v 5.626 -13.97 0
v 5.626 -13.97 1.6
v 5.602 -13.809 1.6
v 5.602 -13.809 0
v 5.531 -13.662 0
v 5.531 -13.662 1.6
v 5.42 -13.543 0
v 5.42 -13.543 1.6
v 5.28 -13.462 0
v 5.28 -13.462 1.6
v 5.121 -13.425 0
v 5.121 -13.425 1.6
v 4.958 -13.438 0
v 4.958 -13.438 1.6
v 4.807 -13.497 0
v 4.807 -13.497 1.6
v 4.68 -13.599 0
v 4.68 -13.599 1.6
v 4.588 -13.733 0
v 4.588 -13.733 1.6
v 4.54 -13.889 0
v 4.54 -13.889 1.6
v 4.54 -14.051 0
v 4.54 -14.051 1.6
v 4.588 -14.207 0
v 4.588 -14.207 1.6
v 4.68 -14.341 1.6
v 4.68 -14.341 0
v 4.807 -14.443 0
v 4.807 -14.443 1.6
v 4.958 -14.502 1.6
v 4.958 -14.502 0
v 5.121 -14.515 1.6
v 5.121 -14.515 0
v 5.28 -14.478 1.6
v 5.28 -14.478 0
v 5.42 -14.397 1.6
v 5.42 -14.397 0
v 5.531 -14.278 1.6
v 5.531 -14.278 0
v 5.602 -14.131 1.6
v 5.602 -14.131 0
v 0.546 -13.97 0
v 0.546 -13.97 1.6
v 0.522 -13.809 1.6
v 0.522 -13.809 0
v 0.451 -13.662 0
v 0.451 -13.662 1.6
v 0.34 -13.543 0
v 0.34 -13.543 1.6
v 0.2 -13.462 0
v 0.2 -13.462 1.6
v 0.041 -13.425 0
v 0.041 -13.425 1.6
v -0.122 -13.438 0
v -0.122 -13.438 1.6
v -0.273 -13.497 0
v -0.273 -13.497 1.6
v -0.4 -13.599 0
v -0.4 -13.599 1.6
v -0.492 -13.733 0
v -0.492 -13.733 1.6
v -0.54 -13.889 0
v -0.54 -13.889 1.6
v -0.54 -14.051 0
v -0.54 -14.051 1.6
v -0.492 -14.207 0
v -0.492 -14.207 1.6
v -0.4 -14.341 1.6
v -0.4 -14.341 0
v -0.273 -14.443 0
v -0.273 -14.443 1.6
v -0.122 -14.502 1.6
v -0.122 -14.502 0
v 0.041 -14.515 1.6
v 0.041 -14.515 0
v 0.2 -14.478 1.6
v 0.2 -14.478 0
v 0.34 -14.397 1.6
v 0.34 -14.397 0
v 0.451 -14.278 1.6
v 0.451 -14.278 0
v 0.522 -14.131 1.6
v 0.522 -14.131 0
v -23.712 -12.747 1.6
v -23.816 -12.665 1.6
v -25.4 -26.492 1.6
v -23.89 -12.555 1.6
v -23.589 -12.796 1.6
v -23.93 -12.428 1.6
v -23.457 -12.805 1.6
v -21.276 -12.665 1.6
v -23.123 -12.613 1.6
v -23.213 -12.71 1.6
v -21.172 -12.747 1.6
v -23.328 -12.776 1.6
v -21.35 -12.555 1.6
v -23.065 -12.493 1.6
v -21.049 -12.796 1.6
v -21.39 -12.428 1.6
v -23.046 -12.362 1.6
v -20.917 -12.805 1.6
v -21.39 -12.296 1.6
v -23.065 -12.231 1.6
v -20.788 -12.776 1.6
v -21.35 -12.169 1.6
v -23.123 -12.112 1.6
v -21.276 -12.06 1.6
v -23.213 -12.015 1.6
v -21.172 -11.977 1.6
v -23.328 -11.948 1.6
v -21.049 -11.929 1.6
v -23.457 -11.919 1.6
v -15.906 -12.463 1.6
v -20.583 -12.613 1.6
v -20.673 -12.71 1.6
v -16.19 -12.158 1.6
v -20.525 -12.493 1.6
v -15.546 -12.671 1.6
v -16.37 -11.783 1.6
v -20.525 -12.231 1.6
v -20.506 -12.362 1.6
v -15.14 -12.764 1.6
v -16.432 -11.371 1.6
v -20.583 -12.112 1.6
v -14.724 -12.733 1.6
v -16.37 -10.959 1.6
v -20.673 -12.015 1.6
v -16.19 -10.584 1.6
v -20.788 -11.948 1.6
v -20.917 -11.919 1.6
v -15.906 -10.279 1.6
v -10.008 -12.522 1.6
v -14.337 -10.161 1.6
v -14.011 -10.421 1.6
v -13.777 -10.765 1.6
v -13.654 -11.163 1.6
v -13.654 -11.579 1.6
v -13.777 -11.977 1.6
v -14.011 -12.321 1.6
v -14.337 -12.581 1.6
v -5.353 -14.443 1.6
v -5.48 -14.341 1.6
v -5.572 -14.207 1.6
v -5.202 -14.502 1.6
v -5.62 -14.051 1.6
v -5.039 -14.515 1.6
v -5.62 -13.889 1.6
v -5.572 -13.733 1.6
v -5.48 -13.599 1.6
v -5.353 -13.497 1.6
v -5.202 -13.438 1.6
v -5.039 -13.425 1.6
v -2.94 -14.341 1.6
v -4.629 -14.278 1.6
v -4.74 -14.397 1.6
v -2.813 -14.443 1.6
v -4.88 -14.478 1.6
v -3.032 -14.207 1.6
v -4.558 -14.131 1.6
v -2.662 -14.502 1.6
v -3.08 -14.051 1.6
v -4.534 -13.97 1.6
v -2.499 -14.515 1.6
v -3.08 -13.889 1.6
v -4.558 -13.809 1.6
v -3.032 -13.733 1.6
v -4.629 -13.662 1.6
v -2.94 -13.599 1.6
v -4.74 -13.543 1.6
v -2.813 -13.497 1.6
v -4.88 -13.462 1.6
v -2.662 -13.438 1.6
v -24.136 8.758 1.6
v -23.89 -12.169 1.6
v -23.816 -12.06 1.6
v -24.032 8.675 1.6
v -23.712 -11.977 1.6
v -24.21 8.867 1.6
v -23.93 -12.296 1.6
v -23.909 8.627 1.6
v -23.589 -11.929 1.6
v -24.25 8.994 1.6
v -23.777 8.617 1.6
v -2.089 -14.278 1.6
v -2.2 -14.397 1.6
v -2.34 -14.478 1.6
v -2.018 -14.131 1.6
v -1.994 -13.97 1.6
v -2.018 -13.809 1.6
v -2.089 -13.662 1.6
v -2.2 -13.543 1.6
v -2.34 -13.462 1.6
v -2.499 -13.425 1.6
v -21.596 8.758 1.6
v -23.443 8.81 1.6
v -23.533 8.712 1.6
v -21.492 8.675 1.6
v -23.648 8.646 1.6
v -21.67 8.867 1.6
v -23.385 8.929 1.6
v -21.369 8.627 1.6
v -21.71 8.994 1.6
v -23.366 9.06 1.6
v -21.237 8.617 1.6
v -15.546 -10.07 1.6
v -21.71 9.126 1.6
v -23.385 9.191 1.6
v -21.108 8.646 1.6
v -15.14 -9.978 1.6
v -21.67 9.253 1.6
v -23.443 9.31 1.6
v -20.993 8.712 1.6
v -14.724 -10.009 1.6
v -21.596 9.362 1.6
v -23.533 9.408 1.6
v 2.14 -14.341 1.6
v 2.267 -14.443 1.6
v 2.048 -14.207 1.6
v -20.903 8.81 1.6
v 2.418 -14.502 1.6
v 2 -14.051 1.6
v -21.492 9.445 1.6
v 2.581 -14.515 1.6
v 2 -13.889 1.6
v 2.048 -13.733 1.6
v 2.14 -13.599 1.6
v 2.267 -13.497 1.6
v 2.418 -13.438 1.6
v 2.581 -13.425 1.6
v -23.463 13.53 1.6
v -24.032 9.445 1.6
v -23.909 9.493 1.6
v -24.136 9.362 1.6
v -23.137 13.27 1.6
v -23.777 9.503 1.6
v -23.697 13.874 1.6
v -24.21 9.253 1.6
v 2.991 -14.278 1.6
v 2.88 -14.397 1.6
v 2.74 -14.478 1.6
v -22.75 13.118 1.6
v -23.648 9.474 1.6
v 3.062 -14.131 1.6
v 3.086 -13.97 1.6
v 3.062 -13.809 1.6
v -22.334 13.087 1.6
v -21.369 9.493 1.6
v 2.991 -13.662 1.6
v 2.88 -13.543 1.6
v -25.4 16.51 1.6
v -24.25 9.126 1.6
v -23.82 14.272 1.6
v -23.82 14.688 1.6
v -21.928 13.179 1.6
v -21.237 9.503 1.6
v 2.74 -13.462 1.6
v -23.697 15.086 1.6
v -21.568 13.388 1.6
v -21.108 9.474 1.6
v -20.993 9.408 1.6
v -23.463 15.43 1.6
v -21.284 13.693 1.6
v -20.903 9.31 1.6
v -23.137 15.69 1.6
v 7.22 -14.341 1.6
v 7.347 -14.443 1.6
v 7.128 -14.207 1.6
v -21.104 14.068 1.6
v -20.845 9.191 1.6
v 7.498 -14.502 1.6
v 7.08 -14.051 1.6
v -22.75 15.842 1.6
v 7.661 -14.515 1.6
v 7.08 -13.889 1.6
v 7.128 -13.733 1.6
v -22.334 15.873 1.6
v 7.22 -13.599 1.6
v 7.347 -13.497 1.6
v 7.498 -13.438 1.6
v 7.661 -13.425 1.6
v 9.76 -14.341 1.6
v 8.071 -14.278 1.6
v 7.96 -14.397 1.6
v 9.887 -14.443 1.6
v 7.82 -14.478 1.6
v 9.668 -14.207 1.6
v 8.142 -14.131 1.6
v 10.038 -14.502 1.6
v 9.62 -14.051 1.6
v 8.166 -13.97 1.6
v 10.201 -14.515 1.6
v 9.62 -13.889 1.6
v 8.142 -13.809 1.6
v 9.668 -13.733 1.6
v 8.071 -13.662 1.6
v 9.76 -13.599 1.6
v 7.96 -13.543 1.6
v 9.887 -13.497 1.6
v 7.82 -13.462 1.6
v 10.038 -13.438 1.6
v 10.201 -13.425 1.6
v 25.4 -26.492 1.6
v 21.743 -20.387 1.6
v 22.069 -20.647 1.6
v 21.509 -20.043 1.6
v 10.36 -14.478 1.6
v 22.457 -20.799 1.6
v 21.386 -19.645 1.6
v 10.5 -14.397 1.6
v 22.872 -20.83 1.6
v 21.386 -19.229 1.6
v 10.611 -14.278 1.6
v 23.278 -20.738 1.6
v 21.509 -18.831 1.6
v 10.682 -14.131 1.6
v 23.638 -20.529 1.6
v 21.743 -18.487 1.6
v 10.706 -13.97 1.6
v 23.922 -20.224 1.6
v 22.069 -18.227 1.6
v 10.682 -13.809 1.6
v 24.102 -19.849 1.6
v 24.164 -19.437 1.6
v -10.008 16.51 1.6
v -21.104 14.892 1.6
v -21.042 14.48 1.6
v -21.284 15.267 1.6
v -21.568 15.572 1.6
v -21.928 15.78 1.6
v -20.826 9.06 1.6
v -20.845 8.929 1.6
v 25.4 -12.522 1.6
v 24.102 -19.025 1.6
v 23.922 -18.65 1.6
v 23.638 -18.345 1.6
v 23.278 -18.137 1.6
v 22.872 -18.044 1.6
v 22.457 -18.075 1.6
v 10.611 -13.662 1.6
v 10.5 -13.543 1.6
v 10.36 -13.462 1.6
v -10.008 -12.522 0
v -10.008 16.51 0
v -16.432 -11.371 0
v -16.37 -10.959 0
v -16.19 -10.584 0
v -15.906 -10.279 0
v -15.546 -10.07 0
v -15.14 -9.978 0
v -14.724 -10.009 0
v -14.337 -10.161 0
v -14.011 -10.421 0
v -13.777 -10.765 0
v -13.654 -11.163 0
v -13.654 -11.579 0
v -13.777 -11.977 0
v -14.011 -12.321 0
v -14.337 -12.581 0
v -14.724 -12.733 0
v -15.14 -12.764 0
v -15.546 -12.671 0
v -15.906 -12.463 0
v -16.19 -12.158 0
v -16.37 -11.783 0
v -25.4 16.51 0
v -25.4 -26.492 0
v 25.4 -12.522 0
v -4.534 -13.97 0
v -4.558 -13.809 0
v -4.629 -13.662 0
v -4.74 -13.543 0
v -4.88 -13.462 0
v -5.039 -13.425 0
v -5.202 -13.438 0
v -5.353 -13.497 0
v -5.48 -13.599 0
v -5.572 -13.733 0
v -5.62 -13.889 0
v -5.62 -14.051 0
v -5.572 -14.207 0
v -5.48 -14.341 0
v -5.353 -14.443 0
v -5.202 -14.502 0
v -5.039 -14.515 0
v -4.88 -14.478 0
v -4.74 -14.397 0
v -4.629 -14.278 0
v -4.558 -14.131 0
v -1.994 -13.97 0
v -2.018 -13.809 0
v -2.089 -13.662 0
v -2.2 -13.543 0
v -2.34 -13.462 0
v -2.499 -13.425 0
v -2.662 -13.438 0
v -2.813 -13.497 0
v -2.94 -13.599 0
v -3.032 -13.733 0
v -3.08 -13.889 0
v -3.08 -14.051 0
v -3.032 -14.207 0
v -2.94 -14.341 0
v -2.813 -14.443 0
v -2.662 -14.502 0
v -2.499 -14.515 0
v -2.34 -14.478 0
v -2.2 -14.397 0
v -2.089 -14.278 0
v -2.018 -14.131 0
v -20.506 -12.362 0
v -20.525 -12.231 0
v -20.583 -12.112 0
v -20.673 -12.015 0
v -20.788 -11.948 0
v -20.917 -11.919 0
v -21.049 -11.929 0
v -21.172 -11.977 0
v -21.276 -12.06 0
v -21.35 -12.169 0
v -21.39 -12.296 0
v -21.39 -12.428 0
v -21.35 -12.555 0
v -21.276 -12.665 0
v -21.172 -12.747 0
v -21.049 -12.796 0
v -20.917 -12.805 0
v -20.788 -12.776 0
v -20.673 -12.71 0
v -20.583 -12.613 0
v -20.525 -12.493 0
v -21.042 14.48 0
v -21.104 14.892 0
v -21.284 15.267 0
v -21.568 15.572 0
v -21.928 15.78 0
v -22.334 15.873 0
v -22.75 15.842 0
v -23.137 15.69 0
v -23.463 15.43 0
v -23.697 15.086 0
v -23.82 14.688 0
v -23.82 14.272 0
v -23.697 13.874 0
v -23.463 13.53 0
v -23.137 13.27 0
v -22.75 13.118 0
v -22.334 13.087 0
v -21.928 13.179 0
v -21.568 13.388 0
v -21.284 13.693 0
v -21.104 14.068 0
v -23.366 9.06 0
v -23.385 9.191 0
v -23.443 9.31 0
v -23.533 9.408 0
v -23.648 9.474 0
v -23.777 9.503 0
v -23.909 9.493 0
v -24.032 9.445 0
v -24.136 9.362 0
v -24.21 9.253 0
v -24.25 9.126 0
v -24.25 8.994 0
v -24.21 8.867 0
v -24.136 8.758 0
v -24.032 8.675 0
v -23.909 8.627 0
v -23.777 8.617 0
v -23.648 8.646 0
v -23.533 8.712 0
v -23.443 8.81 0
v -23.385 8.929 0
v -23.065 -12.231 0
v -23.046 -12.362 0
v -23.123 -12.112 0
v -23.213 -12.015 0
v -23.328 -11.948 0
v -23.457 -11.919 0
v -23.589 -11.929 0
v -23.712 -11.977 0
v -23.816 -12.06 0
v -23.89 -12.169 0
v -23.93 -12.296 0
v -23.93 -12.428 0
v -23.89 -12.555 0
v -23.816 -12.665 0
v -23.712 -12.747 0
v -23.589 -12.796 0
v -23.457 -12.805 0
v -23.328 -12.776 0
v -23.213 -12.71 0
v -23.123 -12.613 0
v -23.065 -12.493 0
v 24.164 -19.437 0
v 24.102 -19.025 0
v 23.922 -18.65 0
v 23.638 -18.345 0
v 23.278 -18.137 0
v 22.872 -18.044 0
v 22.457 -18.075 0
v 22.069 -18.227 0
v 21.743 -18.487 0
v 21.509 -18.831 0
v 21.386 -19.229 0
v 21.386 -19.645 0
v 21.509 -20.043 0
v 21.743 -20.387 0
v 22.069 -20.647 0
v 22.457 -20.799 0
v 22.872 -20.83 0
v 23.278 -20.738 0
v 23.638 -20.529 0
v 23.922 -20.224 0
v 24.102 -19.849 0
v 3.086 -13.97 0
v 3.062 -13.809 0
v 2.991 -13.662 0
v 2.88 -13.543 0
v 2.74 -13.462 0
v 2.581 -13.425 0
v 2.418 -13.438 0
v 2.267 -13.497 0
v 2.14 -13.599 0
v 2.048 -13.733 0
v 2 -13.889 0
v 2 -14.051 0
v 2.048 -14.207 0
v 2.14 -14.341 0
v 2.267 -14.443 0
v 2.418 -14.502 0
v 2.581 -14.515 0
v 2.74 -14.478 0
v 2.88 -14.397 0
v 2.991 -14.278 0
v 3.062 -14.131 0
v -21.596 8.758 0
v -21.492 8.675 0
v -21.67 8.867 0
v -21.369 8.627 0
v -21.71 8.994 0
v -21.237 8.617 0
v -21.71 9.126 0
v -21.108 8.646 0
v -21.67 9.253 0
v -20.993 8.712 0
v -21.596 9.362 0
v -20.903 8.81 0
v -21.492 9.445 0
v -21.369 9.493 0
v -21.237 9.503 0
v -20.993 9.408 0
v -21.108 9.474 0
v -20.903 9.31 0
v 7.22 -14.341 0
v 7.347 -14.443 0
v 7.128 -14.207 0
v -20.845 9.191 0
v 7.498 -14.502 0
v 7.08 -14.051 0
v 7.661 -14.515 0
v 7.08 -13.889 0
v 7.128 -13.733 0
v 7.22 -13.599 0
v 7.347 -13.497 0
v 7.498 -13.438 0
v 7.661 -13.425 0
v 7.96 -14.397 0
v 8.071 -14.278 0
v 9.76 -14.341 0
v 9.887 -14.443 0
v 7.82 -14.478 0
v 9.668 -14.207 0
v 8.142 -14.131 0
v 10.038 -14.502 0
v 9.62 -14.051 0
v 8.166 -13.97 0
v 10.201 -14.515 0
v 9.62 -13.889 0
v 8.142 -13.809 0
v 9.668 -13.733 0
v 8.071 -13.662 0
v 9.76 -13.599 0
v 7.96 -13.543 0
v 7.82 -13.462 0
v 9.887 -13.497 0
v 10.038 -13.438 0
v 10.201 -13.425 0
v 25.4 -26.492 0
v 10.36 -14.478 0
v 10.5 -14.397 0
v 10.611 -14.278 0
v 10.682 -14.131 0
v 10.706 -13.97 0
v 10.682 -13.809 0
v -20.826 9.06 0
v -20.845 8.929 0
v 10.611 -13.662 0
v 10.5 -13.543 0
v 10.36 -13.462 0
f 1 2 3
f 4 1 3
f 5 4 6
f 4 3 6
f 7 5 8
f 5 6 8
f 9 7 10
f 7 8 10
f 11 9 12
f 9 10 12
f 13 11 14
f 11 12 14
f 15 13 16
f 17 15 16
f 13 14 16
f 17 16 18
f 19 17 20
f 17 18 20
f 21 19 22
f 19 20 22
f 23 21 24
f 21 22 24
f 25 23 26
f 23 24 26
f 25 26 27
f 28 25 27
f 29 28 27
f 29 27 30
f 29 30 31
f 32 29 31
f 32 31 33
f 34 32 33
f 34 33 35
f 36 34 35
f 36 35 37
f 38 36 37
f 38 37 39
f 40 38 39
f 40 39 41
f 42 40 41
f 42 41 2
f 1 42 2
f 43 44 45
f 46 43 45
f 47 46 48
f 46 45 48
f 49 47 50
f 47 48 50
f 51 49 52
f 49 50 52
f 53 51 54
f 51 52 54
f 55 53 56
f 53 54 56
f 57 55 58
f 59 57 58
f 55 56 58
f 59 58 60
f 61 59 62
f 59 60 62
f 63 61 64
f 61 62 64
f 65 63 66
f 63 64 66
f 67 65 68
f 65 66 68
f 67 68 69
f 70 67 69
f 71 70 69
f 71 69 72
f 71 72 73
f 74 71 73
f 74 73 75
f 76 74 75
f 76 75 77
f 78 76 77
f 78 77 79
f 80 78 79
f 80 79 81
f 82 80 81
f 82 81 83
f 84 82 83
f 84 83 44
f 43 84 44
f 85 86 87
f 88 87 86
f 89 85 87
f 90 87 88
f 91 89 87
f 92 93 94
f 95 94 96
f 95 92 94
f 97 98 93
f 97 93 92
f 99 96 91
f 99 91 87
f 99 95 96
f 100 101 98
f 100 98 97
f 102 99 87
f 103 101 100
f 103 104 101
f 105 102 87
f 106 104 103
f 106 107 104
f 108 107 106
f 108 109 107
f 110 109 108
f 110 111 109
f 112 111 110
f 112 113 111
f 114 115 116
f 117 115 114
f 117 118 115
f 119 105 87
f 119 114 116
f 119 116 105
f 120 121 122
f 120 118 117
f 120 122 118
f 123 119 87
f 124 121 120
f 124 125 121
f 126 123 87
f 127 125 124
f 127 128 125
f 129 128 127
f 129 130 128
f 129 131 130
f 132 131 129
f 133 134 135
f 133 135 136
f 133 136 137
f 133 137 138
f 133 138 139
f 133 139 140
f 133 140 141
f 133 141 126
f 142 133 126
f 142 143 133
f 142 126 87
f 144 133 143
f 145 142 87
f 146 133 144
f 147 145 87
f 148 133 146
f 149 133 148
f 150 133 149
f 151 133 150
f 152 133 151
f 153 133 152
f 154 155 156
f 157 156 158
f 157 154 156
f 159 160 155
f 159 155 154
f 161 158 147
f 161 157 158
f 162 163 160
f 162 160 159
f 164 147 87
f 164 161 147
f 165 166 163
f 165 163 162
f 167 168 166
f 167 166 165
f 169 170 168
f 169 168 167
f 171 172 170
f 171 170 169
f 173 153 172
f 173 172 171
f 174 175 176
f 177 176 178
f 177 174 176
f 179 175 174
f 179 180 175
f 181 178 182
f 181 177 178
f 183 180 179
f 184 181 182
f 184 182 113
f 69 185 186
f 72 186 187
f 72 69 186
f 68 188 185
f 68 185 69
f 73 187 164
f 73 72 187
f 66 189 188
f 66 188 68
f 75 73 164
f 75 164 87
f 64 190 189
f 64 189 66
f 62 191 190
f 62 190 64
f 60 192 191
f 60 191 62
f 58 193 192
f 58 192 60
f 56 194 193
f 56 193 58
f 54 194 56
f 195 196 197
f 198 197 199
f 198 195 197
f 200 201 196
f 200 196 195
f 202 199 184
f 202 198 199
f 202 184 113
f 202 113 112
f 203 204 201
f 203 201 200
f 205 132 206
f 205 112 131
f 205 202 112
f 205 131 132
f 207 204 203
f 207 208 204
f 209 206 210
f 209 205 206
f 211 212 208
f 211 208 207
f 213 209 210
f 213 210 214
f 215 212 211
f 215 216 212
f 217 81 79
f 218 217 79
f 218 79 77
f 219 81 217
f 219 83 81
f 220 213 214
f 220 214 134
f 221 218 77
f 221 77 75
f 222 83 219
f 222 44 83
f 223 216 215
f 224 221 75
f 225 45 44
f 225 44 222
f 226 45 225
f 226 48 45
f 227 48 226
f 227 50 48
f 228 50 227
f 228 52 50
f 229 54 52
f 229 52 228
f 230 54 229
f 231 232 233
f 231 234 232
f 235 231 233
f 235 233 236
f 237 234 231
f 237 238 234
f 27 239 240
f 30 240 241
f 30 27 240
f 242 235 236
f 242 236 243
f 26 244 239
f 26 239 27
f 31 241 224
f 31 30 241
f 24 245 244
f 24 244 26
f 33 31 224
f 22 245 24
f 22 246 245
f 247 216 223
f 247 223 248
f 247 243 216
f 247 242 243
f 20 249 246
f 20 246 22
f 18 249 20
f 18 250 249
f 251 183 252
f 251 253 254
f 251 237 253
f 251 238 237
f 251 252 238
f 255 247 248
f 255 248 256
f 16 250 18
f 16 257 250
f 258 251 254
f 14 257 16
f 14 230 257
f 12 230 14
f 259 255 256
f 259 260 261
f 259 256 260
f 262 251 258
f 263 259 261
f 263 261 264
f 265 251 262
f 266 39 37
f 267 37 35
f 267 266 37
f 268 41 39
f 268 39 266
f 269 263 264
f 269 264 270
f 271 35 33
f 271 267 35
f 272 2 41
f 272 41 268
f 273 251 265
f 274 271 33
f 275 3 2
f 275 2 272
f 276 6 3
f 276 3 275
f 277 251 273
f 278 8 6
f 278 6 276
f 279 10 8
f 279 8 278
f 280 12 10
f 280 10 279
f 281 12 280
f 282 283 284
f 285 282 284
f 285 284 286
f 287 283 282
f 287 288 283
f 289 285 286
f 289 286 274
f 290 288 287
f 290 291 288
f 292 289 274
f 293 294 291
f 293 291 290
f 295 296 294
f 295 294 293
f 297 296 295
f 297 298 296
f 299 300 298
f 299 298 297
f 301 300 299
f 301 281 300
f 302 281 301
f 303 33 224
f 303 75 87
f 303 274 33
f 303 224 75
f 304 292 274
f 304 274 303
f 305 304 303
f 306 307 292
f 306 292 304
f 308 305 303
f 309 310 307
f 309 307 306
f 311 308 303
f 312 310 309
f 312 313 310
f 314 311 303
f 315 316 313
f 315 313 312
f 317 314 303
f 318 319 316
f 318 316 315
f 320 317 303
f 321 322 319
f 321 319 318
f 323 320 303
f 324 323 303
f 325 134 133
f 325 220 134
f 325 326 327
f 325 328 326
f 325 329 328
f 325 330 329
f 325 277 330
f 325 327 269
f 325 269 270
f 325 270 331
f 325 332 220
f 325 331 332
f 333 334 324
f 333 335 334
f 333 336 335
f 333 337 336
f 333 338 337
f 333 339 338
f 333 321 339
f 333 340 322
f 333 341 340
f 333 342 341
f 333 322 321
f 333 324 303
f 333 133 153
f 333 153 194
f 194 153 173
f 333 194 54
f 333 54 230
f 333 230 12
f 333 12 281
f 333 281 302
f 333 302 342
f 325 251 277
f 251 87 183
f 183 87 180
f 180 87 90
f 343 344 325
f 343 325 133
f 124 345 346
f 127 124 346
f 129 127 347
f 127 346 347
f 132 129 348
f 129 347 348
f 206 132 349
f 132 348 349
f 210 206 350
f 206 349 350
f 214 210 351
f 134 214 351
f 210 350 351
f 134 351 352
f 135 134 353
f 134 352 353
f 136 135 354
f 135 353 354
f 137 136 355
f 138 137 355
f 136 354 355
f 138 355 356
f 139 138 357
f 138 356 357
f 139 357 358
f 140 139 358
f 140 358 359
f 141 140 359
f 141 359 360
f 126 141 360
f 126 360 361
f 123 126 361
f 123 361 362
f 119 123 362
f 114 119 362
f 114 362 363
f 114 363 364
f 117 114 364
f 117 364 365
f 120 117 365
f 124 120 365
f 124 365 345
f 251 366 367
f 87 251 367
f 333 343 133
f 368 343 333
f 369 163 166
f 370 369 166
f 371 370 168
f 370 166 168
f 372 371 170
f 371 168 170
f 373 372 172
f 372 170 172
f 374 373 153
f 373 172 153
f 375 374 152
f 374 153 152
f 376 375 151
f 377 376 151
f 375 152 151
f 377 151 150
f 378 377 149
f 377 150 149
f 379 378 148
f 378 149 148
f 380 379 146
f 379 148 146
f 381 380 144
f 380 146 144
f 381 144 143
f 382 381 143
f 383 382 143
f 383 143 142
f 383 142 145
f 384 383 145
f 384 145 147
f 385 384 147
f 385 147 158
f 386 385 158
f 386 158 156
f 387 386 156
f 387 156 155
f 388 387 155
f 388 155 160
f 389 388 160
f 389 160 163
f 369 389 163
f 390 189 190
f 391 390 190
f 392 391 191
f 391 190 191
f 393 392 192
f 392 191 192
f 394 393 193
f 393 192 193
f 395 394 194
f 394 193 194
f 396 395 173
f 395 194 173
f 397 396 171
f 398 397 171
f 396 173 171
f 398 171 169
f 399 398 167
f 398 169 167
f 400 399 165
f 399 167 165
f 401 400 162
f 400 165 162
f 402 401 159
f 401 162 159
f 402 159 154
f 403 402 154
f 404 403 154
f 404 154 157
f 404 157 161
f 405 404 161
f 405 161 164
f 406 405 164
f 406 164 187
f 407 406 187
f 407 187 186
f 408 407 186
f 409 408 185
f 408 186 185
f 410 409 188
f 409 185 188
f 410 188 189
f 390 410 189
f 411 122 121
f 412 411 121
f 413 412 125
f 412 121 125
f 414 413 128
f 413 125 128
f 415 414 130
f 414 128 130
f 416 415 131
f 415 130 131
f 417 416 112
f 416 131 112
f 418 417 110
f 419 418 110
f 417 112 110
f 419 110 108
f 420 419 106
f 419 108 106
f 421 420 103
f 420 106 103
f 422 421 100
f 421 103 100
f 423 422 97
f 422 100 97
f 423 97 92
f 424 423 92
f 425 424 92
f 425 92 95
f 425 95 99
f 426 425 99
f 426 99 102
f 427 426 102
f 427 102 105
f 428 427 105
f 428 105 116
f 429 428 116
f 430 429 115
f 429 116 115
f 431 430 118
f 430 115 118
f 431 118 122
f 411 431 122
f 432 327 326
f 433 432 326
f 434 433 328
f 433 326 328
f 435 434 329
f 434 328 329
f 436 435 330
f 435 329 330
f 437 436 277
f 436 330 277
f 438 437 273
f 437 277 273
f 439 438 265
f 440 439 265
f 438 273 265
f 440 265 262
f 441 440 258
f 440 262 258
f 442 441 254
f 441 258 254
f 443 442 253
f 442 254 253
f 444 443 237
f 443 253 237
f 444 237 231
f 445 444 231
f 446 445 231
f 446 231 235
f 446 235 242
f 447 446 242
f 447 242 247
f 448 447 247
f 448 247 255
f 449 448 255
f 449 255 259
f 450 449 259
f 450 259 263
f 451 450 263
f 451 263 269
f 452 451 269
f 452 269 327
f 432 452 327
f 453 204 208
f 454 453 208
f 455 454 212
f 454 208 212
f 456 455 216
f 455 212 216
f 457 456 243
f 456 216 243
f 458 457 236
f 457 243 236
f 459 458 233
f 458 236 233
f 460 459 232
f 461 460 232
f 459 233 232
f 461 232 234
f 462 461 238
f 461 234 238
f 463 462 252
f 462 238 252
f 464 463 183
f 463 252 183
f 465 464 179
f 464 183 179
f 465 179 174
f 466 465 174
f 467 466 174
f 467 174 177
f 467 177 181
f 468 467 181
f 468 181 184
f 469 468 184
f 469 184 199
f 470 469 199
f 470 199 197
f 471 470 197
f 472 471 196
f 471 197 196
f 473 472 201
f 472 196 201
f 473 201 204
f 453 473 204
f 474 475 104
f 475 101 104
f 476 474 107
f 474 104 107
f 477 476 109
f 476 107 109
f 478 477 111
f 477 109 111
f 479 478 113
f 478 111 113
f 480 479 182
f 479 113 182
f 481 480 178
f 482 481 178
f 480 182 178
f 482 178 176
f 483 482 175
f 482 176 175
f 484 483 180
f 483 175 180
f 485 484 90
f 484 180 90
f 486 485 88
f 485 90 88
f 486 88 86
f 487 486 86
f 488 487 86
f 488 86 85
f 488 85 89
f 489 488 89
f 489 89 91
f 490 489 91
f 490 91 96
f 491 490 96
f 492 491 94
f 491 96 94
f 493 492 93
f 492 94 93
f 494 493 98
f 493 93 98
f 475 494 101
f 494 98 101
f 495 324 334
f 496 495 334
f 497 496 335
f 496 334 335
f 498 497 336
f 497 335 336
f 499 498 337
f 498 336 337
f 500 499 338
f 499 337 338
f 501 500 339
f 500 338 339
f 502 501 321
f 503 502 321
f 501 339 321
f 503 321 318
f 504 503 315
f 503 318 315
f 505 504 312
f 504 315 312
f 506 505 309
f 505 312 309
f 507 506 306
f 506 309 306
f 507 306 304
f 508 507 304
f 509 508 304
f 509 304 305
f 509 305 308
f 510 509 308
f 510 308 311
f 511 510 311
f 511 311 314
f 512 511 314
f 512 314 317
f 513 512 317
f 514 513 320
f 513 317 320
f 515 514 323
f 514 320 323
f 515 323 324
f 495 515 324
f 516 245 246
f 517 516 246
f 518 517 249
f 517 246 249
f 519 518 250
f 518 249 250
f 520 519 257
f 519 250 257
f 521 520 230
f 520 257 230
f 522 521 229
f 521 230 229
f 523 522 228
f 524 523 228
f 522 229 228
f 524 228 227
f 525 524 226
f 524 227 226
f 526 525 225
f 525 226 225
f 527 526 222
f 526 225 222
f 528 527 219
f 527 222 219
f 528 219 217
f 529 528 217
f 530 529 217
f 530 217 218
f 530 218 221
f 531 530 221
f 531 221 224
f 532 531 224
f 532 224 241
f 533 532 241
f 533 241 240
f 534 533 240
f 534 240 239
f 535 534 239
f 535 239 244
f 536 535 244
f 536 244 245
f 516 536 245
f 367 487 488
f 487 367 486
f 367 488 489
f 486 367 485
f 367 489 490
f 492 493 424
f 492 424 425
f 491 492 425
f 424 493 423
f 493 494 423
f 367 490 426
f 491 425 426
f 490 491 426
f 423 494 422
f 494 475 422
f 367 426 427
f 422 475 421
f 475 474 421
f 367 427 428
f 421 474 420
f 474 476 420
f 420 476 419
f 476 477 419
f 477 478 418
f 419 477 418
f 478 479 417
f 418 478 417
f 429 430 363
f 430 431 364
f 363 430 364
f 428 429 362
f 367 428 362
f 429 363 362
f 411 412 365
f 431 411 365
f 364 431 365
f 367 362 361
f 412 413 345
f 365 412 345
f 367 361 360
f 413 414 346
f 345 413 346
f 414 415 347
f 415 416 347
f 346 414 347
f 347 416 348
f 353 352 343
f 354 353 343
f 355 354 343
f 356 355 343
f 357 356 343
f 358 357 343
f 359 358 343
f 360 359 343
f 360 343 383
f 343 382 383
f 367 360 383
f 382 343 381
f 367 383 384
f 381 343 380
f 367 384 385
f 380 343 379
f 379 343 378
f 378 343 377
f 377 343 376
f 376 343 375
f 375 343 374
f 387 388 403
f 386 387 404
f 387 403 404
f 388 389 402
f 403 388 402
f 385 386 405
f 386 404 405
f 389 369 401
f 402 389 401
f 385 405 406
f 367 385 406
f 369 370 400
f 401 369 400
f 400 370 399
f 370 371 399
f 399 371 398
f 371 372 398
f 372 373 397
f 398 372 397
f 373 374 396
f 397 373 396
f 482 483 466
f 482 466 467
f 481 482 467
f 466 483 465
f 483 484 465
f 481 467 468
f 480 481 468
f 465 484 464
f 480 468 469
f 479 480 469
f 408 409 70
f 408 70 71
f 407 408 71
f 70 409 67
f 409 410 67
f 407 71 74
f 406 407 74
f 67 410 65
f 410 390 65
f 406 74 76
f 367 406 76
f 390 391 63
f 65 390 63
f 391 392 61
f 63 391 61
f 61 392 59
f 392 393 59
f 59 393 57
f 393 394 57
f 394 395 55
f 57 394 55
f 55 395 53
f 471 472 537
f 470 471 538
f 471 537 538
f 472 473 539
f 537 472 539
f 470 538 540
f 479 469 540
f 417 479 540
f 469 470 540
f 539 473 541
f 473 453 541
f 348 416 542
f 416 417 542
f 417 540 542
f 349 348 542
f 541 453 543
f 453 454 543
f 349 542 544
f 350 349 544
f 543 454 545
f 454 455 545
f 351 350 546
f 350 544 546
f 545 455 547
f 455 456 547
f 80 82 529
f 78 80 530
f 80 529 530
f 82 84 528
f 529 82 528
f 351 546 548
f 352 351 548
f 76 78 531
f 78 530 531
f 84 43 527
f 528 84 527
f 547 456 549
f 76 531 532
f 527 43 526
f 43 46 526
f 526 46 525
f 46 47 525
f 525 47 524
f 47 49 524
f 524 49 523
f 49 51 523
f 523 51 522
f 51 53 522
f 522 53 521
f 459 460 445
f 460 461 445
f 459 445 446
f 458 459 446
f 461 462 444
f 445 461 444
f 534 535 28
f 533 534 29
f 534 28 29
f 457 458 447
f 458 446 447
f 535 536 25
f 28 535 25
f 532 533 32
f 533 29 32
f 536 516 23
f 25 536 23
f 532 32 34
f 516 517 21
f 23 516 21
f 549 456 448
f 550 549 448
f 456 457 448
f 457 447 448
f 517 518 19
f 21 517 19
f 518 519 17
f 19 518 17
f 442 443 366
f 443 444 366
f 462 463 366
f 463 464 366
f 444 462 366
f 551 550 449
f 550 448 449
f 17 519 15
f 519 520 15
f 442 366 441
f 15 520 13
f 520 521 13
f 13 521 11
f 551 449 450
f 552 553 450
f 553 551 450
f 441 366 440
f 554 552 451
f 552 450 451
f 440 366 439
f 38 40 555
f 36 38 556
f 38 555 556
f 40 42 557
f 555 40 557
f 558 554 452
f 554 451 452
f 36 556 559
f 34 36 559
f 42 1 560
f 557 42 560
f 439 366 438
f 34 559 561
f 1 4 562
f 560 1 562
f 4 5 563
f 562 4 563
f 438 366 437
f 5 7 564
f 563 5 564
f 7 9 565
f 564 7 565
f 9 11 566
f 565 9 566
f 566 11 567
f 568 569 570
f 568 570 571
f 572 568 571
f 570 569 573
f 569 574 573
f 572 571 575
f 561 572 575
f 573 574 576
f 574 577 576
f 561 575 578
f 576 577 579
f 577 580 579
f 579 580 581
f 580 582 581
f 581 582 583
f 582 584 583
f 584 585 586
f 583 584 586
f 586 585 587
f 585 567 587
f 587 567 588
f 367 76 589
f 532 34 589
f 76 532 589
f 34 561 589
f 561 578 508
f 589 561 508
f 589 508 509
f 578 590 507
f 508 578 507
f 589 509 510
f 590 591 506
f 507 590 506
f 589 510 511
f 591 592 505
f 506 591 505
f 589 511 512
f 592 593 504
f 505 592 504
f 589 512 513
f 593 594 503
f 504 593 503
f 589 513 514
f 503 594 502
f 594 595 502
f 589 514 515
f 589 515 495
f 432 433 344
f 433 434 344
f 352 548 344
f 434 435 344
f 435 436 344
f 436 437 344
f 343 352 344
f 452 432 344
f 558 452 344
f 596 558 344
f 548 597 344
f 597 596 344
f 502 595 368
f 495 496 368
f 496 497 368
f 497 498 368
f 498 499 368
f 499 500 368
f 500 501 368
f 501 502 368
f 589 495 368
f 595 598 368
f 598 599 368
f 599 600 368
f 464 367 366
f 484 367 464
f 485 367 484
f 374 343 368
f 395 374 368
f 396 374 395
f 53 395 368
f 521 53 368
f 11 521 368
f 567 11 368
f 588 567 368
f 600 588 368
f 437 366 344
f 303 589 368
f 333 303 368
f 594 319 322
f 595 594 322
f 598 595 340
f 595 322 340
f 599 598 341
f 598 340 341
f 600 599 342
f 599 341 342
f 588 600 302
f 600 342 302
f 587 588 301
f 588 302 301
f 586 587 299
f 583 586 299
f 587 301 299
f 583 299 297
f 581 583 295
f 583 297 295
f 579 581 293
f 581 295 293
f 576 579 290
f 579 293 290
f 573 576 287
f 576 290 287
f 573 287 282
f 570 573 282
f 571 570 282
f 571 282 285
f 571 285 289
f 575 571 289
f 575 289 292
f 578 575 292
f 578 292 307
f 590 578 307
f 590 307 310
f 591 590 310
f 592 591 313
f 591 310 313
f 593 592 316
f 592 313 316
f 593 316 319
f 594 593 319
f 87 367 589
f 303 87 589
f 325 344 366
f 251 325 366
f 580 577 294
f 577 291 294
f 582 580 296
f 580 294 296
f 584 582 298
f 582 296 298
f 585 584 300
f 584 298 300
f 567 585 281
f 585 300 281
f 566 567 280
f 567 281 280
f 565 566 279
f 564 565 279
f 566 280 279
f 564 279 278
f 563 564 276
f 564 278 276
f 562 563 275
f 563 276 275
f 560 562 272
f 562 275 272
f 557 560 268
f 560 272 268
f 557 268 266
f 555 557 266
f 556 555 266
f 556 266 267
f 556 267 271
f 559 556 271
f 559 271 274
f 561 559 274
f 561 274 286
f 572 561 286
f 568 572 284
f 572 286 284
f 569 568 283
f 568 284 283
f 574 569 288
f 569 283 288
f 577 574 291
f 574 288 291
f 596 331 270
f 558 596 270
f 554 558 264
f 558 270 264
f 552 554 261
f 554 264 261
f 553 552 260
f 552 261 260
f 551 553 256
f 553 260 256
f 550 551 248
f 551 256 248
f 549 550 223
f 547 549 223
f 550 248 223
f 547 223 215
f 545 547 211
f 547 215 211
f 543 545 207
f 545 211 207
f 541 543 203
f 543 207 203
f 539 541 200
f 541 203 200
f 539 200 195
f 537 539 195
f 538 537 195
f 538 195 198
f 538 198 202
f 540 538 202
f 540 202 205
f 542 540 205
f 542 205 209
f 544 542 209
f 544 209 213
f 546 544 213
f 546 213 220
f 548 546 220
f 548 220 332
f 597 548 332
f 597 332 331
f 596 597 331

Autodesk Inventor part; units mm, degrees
ref_plane "YZ Plane" through (0, 0, 0) normal (1, 0, 0) x (0, 1, 0)
ref_plane "XZ Plane" through (0, 0, 0) normal (0, 1, 0) x (-1, 0, 0)
ref_plane "XY Plane" through (0, 0, 0) normal (0, 0, 1) x (1, 0, 0)
sketch "Sketch1" plane through (0, 0, 0) normal (0, 0, 1) x (1, 0, 0)
  line L0 (-25.4, -16.51) -> (25.4, -16.51) projected
  line L1 (25.4, -16.51) -> (25.4, 16.51) projected
  line L2 (25.4, 16.51) -> (-25.4, 16.51) projected
  line L3 (-25.4, 16.51) -> (-25.4, -10.64) projected
  line L4 (-10.0076, 16.51) -> (-10.0076, -12.5222)
  line L5 (-10.0076, -12.5222) -> (25.4, -12.5222)
  line L6 (-25.4, -16.51) -> (-25.4, -26.4922)
  line L7 (-25.4, -26.4922) -> (25.4, -26.4922)
  line L8 (25.4, -26.4922) -> (25.4, -16.51)
  circle A0 centre (-2.54, -13.97) radius 0.5461 projected
  circle A1 centre (2.54, -13.97) radius 0.5461 projected
  circle A2 centre (7.62, -13.97) radius 0.5461 projected
  circle A3 centre (-5.08, -7.62) radius 0.4445 projected
  circle A4 centre (0, -7.62) radius 0.4445 projected
  circle A5 centre (5.08, -7.62) radius 0.4445 projected
  circle A6 centre (10.16, -7.62) radius 0.4445 projected
  circle A7 centre (-5.08, 10.16) radius 0.4445 projected
  circle A8 centre (0, 10.16) radius 0.4445 projected
  circle A9 centre (5.08, 10.16) radius 0.4445 projected
  circle A10 centre (10.16, 10.16) radius 0.4445 projected
  circle A11 centre (12.7, 10.16) radius 0.4445 projected
  circle A12 centre (7.62, 10.16) radius 0.4445 projected
  circle A13 centre (2.54, 10.16) radius 0.4445 projected
  circle A14 centre (-2.54, 10.16) radius 0.4445 projected
  circle A15 centre (12.7, -7.62) radius 0.4445 projected
  circle A16 centre (7.62, -7.62) radius 0.4445 projected
  circle A17 centre (2.54, -7.62) radius 0.4445 projected
  circle A18 centre (-2.54, -7.62) radius 0.4445 projected
  circle A19 centre (10.16, -13.97) radius 0.5461 projected
  circle A20 centre (5.08, -13.97) radius 0.5461 projected
  circle A21 centre (0, -13.97) radius 0.5461 projected
  circle A22 centre (-5.08, -13.97) radius 0.5461 projected
  circle A23 centre (2.6924, -2.0574) radius 0.4445 projected
  circle A24 centre (-2.3876, -2.0574) radius 0.4445 projected
  circle A25 centre (-9.0424, 12.2174) radius 0.4445 projected
  circle A26 centre (-14.1224, 12.2174) radius 0.4445 projected
  circle A27 centre (-16.6624, 12.2174) radius 0.4445 projected
  circle A28 centre (-11.5824, 12.2174) radius 0.4445 projected
  circle A29 centre (-4.9276, -2.0574) radius 0.4445 projected
  circle A30 centre (0.1524, -2.0574) radius 0.4445 projected
  line L9 (-19.25, -14.29) -> (-25.4, -14.29) projected
  line L10 (-25.4, -14.29) -> (-25.4, -16.51) projected
  line L11 (-25.4, -10.64) -> (-19.25, -10.64) projected
  line L12 (-19.25, -10.64) -> (-19.25, -14.29) projected
  line L13 (-25.4, -14.29) -> (-25.4, -10.64)
  line L14 (-25.4, -10.64) -> (-19.25, -10.64)
  line L15 (-19.25, -10.64) -> (-19.25, -14.29)
  line L16 (-19.25, -14.29) -> (-25.4, -14.29)
  circle A31 centre (-23.81, 9.06) radius 0.4445 projected
  circle A32 centre (17.14, 9.37) radius 0.4445 projected
  circle A33 centre (19.68, 9.37) radius 0.4445 projected
  circle A34 centre (-21.27, 9.06) radius 0.4445 projected
  circle A35 centre (19.05, 13.97) radius 1.397 projected
  point P0 (0, 0)
  dimension "d0" = 29.0322
  dimension "d1" = 35.4076
  dimension "d2" = 15.3924
  dimension "d3" = 13.97
extrude "Extrusion1" add sketch "Sketch1" along normal blind 1.6 contours L10 L9 L12 L11 L3 L2 L4 L5 L1 L0 | L0 L8 L7 L6 | L13 L11 L12 L9 | A0 | A1 | A2 | A19 | A20 | A21 | A22 | A26 | A27 | A28 | A31 | A34
sketch "Sketch2" plane through (0, 0, 1.6) normal (0, 0, 1) x (1, 0, 0)
  circle A0 centre (10.16, -13.97) radius 0.5461
  circle A1 centre (7.62, -13.97) radius 0.5461
  circle A2 centre (5.08, -13.97) radius 0.5461
  circle A3 centre (2.54, -13.97) radius 0.5461
  circle A4 centre (0, -13.97) radius 0.5461
  circle A5 centre (-2.54, -13.97) radius 0.5461
  circle A6 centre (-5.08, -13.97) radius 0.5461
  point P0 (0, 0)
extrude "Extrusion2" cut sketch "Sketch2" against normal blind 1.6
sketch "Sketch3" plane through (0, 0, 1.6) normal (0, 0, 1) x (1, 0, 0)
  line L0 (-25.4, 16.51) -> (-25.4, -26.4922) construction
  line L1 (-25.4, 12.11) -> (-10.0076, 12.11) construction
  line L2 (-10.0076, -12.5222) -> (-10.0076, 16.51) construction
  line L3 (-10.0076, 16.51) -> (-25.4, 16.51) construction
  line L4 (25.4, -12.5222) -> (-10.0076, -12.5222) construction
  line L5 (20.07, -12.5222) -> (20.07, -26.4922) construction
  line L6 (-25.4, -26.4922) -> (25.4, -26.4922) construction
  line L7 (25.4, -26.4922) -> (25.4, -12.5222) construction
  point P0 (0, 0)
  dimension "d8" = 4.4
  dimension "d9" = 5.33
sketch "Sketch4" plane through (0, 0, 1.6) normal (0, 0, 1) x (1, 0, 0)
  circle A0 centre (-23.49, -12.3622) radius 0.4445
  circle A1 centre (-20.95, -12.3622) radius 0.4445
  line L0 (-25.4, 16.51) -> (-25.4, -26.4922) projected
  line L1 (-25.4, -26.4922) -> (25.4, -26.4922) projected
  point P0 (0, 0)
  dimension "d10" = 0.889
  dimension "d11" = 0.889
  dimension "d12" = 1.91
  dimension "d13" = 2.54
  dimension "d14" = 0
  dimension "d15" = 14.13
extrude "Extrusion3" cut sketch "Sketch4" against normal blind 25.4
sketch "Sketch5" plane through (0, 0, 1.6) normal (0, 0, 1) x (1, 0, 0)
  circle A0 centre (-23.81, 9.06) radius 0.4445 projected
  circle A1 centre (17.14, 9.37) radius 0.4445 projected
  circle A2 centre (19.68, 9.37) radius 0.4445 projected
  circle A3 centre (-21.27, 9.06) radius 0.4445 projected
  line L0 (-25.4, -14.29) -> (-19.25, -14.29) projected
  line L1 (-19.25, -14.29) -> (-19.25, -10.64) projected
  line L2 (-19.25, -10.64) -> (-25.4, -10.64) projected
  line L3 (-25.4, 16.51) -> (-25.4, -10.64) projected
  line L4 (25.4, 16.51) -> (-25.4, 16.51) projected
  line L5 (25.4, -16.51) -> (25.4, 16.51) projected
  line L6 (-25.4, -16.51) -> (25.4, -16.51) projected
  line L7 (-25.4, -14.29) -> (-25.4, -16.51) projected
  circle A4 centre (-5.08, -13.97) radius 0.5461 projected
  circle A5 centre (0, -13.97) radius 0.5461 projected
  circle A6 centre (5.08, -13.97) radius 0.5461 projected
  circle A7 centre (10.16, -13.97) radius 0.5461 projected
  circle A8 centre (0.1524, -2.0574) radius 0.4445 projected
  circle A9 centre (-4.9276, -2.0574) radius 0.4445 projected
  circle A10 centre (-11.5824, 12.2174) radius 0.4445 projected
  circle A11 centre (-16.6624, 12.2174) radius 0.4445 projected
  circle A12 centre (-2.54, -7.62) radius 0.4445 projected
  circle A13 centre (2.54, -7.62) radius 0.4445 projected
  circle A14 centre (7.62, -7.62) radius 0.4445 projected
  circle A15 centre (12.7, -7.62) radius 0.4445 projected
  circle A16 centre (-2.54, 10.16) radius 0.4445 projected
  circle A17 centre (2.54, 10.16) radius 0.4445 projected
  circle A18 centre (7.62, 10.16) radius 0.4445 projected
  circle A19 centre (12.7, 10.16) radius 0.4445 projected
  circle A20 centre (10.16, 10.16) radius 0.4445 projected
  circle A21 centre (5.08, 10.16) radius 0.4445 projected
  circle A22 centre (0, 10.16) radius 0.4445 projected
  circle A23 centre (-5.08, 10.16) radius 0.4445 projected
  circle A24 centre (10.16, -7.62) radius 0.4445 projected
  circle A25 centre (5.08, -7.62) radius 0.4445 projected
  circle A26 centre (0, -7.62) radius 0.4445 projected
  circle A27 centre (-5.08, -7.62) radius 0.4445 projected
  circle A28 centre (-14.1224, 12.2174) radius 0.4445 projected
  circle A29 centre (-9.0424, 12.2174) radius 0.4445 projected
  circle A30 centre (-2.3876, -2.0574) radius 0.4445 projected
  circle A31 centre (2.6924, -2.0574) radius 0.4445 projected
  circle A32 centre (7.62, -13.97) radius 0.5461 projected
  circle A33 centre (2.54, -13.97) radius 0.5461 projected
  circle A34 centre (-2.54, -13.97) radius 0.5461 projected
  circle A35 centre (19.05, 13.97) radius 1.397 projected
  point P0 (0, 0)
extrude "Extrusion4" cut sketch "Sketch5" against normal blind 25.4 contours A0 | A3
sketch "Sketch6" plane through (0, 0, 1.6) normal (0, 0, 1) x (1, 0, 0)
  circle A0 centre (22.7674, -19.4372) radius 1.397
  point P0 (0, 0)
  dimension "d20" = 2.794
extrude "Extrusion5" cut sketch "Sketch6" against normal blind 25.4
sketch "Sketch7" plane through (0, 0, 0) normal (0, 0, -1) x (-1, 0, 0)
  circle A0 centre (15.0353, -11.3709) radius 1.397
  line L0 (24.1179, -7.9159) -> (10.0987, -7.9159) projected
  point P0 (0, 0)
  dimension "d23" = 2.794
  dimension "d24" = 3.455
extrude "Extrusion6" cut sketch "Sketch7" against normal blind 25.4
sketch "Sketch8" plane through (0, 0, 1.6) normal (0, 0, 1) x (1, 0, 0)
  circle A0 centre (-22.4387, 14.4799) radius 1.397
  point P0 (0, 0)
  dimension "d27" = 2.794
extrude "Extrusion7" cut sketch "Sketch8" against normal blind 25.4
properties part number "Control Board"
